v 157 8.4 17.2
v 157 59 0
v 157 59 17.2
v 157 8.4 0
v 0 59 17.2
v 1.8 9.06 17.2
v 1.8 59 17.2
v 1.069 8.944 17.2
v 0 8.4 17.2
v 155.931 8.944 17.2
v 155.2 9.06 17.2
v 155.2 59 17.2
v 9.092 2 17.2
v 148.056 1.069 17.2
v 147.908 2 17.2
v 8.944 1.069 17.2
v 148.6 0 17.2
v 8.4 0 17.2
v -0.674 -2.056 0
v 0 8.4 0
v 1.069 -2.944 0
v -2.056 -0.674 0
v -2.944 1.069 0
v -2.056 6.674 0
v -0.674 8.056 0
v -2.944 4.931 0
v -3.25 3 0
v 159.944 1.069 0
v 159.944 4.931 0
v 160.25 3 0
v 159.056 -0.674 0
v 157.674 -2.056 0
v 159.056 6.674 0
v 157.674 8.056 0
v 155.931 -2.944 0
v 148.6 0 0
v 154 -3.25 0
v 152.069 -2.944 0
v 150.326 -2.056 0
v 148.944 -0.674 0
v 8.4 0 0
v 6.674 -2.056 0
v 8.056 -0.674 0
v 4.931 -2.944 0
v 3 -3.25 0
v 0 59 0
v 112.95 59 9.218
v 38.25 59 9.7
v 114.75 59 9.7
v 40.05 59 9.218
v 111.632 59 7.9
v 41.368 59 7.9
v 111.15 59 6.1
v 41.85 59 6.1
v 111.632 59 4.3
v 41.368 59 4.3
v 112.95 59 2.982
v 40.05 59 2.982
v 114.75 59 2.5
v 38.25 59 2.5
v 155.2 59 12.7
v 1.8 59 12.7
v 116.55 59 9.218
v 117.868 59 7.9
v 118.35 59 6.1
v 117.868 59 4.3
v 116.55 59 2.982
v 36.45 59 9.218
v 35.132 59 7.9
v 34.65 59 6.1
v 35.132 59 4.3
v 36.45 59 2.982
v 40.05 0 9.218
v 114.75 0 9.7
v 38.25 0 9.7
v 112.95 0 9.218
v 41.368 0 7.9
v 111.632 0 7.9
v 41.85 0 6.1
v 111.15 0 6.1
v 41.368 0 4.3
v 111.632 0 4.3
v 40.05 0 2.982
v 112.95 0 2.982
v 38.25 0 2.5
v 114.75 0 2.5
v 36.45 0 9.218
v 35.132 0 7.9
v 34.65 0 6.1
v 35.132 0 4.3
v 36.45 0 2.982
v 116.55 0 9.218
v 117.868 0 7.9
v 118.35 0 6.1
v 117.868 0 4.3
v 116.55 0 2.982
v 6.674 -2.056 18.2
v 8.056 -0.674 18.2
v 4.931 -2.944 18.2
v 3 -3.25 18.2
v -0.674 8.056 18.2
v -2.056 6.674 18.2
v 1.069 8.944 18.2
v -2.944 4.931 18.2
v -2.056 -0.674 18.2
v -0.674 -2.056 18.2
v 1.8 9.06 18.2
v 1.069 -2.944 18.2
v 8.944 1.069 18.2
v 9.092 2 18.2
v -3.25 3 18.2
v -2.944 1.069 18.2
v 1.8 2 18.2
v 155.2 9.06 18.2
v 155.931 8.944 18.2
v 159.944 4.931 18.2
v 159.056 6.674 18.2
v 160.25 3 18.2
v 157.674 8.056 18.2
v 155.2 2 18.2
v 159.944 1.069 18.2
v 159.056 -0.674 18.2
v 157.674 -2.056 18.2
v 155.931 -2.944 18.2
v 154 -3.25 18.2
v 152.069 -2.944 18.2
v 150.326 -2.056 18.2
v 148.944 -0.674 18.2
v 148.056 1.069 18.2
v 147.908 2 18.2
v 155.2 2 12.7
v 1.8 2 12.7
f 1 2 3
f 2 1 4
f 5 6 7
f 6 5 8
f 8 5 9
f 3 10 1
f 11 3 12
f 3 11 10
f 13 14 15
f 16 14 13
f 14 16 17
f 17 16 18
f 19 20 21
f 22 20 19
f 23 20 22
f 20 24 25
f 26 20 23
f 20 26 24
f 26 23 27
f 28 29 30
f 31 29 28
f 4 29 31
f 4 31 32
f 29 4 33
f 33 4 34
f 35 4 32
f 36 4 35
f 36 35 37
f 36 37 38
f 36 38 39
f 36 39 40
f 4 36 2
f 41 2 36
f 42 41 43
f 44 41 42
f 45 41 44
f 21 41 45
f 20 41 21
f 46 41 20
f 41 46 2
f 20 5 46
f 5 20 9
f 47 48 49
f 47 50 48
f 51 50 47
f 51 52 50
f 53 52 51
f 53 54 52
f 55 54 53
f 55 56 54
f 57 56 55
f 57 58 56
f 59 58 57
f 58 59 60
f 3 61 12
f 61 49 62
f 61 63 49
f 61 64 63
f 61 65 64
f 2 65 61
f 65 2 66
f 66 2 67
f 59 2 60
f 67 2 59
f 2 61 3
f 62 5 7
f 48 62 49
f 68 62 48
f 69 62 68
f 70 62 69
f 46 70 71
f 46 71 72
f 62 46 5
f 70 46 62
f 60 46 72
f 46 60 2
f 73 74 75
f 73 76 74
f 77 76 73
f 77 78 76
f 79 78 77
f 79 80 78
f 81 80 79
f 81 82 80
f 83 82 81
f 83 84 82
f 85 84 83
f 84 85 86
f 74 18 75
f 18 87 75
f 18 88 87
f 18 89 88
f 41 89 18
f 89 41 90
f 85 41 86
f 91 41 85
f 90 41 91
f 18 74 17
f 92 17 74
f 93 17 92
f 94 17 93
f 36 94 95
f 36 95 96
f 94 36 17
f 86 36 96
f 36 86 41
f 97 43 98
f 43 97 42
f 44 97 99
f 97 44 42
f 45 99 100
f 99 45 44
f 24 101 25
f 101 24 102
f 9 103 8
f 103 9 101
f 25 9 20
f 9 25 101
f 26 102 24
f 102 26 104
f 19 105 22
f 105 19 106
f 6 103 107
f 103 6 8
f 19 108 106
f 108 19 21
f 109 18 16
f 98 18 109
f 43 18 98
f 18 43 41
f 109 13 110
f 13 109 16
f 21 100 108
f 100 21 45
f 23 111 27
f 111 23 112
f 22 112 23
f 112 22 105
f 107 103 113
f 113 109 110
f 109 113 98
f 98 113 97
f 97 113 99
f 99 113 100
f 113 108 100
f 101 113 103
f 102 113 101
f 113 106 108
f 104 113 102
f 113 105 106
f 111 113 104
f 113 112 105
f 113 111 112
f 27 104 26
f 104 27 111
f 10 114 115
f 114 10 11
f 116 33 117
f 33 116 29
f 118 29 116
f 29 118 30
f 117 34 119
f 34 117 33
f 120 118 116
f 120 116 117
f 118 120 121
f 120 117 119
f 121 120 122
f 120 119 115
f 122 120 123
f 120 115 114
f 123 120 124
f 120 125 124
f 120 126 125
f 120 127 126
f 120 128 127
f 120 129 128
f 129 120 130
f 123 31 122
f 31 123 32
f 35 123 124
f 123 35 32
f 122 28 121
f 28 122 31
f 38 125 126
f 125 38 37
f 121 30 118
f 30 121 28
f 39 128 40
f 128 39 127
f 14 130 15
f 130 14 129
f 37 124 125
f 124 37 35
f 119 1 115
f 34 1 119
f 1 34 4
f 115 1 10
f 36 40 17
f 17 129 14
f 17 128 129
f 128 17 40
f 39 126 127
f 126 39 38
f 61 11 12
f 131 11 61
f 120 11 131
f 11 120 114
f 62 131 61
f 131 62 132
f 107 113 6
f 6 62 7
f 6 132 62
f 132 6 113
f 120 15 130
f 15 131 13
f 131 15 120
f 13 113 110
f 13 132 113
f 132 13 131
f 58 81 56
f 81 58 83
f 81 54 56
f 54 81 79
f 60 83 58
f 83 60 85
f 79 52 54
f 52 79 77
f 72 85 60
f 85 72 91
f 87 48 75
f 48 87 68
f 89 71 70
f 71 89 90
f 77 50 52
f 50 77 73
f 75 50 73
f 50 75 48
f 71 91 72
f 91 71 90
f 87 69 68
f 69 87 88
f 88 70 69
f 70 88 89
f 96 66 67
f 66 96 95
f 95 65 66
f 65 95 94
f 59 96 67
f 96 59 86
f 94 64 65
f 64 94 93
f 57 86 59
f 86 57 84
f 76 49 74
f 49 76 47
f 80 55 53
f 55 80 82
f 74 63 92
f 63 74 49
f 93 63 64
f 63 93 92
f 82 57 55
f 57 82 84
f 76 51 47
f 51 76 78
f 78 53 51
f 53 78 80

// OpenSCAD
/**
Glass build plate holder 2-piece
**/

/* [Main] */
// Width of build plate (mm)
plate_width = 153; //[100:400]
// Length of build plate (mm)
plate_length = 236; //[100:400]
// Thickness of build plate (mm)
plate_thickness = 5; //[2:8]
/* [Extras] */
// Diameter of holes for threaded rod
hole_diameter = 7.2; //[4:10]
/* [Hidden] */
support_height = plate_thickness+hole_diameter+5;
support_diameter = plate_thickness*2.5;

union() {
  difference() {
    union() {
      cube([plate_width+4,plate_length/4,support_height]);
      translate([3,3,0])
        cylinder(r=support_diameter/2,h=support_height+1);
      translate([(plate_width+4)-3,3,0])
        cylinder(r=support_diameter/2,h=support_height+1);
    }
    translate([1.8,2,(support_height+.5)-plate_thickness])
      cube([plate_width+.4,(plate_length/4)+1,plate_thickness+4]);
    translate([plate_width/4,-.1,(support_height-plate_thickness)/2])
      rotate([270,0,0])
        cylinder(r=hole_diameter/2,h=plate_length);
    translate([plate_width-(plate_width/4),-.1,(support_height-plate_thickness)/2])
      rotate([270,0,0])
        cylinder(r=hole_diameter/2,h=plate_length);
  }
  //translate([plate_width/3,plate_length/8,(support_height-plate_thickness)-1])
  //  cylinder(r=hole_diameter/2,h=3);
  //translate([plate_width-(plate_width/3),plate_length/8,(support_height-plate_thickness)-1])
  //  cylinder(r=hole_diameter/2,h=3);
}
